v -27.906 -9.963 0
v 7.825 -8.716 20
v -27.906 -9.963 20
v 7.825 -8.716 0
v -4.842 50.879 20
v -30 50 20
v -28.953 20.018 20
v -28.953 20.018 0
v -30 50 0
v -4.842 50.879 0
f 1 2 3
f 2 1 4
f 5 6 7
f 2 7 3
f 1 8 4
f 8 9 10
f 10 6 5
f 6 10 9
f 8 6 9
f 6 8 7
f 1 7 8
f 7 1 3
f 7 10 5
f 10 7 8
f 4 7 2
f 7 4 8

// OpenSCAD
translate([-30,50,0])
scale([3,3,1])
rotate([0,0,-88]) {
    difference() {
        cube([20, 20, 20]);
        translate([10, 0, -1]) {
            rotate([0,0,50]) {
                cube([30, 30, 30]);
            }
        }
    }
}
